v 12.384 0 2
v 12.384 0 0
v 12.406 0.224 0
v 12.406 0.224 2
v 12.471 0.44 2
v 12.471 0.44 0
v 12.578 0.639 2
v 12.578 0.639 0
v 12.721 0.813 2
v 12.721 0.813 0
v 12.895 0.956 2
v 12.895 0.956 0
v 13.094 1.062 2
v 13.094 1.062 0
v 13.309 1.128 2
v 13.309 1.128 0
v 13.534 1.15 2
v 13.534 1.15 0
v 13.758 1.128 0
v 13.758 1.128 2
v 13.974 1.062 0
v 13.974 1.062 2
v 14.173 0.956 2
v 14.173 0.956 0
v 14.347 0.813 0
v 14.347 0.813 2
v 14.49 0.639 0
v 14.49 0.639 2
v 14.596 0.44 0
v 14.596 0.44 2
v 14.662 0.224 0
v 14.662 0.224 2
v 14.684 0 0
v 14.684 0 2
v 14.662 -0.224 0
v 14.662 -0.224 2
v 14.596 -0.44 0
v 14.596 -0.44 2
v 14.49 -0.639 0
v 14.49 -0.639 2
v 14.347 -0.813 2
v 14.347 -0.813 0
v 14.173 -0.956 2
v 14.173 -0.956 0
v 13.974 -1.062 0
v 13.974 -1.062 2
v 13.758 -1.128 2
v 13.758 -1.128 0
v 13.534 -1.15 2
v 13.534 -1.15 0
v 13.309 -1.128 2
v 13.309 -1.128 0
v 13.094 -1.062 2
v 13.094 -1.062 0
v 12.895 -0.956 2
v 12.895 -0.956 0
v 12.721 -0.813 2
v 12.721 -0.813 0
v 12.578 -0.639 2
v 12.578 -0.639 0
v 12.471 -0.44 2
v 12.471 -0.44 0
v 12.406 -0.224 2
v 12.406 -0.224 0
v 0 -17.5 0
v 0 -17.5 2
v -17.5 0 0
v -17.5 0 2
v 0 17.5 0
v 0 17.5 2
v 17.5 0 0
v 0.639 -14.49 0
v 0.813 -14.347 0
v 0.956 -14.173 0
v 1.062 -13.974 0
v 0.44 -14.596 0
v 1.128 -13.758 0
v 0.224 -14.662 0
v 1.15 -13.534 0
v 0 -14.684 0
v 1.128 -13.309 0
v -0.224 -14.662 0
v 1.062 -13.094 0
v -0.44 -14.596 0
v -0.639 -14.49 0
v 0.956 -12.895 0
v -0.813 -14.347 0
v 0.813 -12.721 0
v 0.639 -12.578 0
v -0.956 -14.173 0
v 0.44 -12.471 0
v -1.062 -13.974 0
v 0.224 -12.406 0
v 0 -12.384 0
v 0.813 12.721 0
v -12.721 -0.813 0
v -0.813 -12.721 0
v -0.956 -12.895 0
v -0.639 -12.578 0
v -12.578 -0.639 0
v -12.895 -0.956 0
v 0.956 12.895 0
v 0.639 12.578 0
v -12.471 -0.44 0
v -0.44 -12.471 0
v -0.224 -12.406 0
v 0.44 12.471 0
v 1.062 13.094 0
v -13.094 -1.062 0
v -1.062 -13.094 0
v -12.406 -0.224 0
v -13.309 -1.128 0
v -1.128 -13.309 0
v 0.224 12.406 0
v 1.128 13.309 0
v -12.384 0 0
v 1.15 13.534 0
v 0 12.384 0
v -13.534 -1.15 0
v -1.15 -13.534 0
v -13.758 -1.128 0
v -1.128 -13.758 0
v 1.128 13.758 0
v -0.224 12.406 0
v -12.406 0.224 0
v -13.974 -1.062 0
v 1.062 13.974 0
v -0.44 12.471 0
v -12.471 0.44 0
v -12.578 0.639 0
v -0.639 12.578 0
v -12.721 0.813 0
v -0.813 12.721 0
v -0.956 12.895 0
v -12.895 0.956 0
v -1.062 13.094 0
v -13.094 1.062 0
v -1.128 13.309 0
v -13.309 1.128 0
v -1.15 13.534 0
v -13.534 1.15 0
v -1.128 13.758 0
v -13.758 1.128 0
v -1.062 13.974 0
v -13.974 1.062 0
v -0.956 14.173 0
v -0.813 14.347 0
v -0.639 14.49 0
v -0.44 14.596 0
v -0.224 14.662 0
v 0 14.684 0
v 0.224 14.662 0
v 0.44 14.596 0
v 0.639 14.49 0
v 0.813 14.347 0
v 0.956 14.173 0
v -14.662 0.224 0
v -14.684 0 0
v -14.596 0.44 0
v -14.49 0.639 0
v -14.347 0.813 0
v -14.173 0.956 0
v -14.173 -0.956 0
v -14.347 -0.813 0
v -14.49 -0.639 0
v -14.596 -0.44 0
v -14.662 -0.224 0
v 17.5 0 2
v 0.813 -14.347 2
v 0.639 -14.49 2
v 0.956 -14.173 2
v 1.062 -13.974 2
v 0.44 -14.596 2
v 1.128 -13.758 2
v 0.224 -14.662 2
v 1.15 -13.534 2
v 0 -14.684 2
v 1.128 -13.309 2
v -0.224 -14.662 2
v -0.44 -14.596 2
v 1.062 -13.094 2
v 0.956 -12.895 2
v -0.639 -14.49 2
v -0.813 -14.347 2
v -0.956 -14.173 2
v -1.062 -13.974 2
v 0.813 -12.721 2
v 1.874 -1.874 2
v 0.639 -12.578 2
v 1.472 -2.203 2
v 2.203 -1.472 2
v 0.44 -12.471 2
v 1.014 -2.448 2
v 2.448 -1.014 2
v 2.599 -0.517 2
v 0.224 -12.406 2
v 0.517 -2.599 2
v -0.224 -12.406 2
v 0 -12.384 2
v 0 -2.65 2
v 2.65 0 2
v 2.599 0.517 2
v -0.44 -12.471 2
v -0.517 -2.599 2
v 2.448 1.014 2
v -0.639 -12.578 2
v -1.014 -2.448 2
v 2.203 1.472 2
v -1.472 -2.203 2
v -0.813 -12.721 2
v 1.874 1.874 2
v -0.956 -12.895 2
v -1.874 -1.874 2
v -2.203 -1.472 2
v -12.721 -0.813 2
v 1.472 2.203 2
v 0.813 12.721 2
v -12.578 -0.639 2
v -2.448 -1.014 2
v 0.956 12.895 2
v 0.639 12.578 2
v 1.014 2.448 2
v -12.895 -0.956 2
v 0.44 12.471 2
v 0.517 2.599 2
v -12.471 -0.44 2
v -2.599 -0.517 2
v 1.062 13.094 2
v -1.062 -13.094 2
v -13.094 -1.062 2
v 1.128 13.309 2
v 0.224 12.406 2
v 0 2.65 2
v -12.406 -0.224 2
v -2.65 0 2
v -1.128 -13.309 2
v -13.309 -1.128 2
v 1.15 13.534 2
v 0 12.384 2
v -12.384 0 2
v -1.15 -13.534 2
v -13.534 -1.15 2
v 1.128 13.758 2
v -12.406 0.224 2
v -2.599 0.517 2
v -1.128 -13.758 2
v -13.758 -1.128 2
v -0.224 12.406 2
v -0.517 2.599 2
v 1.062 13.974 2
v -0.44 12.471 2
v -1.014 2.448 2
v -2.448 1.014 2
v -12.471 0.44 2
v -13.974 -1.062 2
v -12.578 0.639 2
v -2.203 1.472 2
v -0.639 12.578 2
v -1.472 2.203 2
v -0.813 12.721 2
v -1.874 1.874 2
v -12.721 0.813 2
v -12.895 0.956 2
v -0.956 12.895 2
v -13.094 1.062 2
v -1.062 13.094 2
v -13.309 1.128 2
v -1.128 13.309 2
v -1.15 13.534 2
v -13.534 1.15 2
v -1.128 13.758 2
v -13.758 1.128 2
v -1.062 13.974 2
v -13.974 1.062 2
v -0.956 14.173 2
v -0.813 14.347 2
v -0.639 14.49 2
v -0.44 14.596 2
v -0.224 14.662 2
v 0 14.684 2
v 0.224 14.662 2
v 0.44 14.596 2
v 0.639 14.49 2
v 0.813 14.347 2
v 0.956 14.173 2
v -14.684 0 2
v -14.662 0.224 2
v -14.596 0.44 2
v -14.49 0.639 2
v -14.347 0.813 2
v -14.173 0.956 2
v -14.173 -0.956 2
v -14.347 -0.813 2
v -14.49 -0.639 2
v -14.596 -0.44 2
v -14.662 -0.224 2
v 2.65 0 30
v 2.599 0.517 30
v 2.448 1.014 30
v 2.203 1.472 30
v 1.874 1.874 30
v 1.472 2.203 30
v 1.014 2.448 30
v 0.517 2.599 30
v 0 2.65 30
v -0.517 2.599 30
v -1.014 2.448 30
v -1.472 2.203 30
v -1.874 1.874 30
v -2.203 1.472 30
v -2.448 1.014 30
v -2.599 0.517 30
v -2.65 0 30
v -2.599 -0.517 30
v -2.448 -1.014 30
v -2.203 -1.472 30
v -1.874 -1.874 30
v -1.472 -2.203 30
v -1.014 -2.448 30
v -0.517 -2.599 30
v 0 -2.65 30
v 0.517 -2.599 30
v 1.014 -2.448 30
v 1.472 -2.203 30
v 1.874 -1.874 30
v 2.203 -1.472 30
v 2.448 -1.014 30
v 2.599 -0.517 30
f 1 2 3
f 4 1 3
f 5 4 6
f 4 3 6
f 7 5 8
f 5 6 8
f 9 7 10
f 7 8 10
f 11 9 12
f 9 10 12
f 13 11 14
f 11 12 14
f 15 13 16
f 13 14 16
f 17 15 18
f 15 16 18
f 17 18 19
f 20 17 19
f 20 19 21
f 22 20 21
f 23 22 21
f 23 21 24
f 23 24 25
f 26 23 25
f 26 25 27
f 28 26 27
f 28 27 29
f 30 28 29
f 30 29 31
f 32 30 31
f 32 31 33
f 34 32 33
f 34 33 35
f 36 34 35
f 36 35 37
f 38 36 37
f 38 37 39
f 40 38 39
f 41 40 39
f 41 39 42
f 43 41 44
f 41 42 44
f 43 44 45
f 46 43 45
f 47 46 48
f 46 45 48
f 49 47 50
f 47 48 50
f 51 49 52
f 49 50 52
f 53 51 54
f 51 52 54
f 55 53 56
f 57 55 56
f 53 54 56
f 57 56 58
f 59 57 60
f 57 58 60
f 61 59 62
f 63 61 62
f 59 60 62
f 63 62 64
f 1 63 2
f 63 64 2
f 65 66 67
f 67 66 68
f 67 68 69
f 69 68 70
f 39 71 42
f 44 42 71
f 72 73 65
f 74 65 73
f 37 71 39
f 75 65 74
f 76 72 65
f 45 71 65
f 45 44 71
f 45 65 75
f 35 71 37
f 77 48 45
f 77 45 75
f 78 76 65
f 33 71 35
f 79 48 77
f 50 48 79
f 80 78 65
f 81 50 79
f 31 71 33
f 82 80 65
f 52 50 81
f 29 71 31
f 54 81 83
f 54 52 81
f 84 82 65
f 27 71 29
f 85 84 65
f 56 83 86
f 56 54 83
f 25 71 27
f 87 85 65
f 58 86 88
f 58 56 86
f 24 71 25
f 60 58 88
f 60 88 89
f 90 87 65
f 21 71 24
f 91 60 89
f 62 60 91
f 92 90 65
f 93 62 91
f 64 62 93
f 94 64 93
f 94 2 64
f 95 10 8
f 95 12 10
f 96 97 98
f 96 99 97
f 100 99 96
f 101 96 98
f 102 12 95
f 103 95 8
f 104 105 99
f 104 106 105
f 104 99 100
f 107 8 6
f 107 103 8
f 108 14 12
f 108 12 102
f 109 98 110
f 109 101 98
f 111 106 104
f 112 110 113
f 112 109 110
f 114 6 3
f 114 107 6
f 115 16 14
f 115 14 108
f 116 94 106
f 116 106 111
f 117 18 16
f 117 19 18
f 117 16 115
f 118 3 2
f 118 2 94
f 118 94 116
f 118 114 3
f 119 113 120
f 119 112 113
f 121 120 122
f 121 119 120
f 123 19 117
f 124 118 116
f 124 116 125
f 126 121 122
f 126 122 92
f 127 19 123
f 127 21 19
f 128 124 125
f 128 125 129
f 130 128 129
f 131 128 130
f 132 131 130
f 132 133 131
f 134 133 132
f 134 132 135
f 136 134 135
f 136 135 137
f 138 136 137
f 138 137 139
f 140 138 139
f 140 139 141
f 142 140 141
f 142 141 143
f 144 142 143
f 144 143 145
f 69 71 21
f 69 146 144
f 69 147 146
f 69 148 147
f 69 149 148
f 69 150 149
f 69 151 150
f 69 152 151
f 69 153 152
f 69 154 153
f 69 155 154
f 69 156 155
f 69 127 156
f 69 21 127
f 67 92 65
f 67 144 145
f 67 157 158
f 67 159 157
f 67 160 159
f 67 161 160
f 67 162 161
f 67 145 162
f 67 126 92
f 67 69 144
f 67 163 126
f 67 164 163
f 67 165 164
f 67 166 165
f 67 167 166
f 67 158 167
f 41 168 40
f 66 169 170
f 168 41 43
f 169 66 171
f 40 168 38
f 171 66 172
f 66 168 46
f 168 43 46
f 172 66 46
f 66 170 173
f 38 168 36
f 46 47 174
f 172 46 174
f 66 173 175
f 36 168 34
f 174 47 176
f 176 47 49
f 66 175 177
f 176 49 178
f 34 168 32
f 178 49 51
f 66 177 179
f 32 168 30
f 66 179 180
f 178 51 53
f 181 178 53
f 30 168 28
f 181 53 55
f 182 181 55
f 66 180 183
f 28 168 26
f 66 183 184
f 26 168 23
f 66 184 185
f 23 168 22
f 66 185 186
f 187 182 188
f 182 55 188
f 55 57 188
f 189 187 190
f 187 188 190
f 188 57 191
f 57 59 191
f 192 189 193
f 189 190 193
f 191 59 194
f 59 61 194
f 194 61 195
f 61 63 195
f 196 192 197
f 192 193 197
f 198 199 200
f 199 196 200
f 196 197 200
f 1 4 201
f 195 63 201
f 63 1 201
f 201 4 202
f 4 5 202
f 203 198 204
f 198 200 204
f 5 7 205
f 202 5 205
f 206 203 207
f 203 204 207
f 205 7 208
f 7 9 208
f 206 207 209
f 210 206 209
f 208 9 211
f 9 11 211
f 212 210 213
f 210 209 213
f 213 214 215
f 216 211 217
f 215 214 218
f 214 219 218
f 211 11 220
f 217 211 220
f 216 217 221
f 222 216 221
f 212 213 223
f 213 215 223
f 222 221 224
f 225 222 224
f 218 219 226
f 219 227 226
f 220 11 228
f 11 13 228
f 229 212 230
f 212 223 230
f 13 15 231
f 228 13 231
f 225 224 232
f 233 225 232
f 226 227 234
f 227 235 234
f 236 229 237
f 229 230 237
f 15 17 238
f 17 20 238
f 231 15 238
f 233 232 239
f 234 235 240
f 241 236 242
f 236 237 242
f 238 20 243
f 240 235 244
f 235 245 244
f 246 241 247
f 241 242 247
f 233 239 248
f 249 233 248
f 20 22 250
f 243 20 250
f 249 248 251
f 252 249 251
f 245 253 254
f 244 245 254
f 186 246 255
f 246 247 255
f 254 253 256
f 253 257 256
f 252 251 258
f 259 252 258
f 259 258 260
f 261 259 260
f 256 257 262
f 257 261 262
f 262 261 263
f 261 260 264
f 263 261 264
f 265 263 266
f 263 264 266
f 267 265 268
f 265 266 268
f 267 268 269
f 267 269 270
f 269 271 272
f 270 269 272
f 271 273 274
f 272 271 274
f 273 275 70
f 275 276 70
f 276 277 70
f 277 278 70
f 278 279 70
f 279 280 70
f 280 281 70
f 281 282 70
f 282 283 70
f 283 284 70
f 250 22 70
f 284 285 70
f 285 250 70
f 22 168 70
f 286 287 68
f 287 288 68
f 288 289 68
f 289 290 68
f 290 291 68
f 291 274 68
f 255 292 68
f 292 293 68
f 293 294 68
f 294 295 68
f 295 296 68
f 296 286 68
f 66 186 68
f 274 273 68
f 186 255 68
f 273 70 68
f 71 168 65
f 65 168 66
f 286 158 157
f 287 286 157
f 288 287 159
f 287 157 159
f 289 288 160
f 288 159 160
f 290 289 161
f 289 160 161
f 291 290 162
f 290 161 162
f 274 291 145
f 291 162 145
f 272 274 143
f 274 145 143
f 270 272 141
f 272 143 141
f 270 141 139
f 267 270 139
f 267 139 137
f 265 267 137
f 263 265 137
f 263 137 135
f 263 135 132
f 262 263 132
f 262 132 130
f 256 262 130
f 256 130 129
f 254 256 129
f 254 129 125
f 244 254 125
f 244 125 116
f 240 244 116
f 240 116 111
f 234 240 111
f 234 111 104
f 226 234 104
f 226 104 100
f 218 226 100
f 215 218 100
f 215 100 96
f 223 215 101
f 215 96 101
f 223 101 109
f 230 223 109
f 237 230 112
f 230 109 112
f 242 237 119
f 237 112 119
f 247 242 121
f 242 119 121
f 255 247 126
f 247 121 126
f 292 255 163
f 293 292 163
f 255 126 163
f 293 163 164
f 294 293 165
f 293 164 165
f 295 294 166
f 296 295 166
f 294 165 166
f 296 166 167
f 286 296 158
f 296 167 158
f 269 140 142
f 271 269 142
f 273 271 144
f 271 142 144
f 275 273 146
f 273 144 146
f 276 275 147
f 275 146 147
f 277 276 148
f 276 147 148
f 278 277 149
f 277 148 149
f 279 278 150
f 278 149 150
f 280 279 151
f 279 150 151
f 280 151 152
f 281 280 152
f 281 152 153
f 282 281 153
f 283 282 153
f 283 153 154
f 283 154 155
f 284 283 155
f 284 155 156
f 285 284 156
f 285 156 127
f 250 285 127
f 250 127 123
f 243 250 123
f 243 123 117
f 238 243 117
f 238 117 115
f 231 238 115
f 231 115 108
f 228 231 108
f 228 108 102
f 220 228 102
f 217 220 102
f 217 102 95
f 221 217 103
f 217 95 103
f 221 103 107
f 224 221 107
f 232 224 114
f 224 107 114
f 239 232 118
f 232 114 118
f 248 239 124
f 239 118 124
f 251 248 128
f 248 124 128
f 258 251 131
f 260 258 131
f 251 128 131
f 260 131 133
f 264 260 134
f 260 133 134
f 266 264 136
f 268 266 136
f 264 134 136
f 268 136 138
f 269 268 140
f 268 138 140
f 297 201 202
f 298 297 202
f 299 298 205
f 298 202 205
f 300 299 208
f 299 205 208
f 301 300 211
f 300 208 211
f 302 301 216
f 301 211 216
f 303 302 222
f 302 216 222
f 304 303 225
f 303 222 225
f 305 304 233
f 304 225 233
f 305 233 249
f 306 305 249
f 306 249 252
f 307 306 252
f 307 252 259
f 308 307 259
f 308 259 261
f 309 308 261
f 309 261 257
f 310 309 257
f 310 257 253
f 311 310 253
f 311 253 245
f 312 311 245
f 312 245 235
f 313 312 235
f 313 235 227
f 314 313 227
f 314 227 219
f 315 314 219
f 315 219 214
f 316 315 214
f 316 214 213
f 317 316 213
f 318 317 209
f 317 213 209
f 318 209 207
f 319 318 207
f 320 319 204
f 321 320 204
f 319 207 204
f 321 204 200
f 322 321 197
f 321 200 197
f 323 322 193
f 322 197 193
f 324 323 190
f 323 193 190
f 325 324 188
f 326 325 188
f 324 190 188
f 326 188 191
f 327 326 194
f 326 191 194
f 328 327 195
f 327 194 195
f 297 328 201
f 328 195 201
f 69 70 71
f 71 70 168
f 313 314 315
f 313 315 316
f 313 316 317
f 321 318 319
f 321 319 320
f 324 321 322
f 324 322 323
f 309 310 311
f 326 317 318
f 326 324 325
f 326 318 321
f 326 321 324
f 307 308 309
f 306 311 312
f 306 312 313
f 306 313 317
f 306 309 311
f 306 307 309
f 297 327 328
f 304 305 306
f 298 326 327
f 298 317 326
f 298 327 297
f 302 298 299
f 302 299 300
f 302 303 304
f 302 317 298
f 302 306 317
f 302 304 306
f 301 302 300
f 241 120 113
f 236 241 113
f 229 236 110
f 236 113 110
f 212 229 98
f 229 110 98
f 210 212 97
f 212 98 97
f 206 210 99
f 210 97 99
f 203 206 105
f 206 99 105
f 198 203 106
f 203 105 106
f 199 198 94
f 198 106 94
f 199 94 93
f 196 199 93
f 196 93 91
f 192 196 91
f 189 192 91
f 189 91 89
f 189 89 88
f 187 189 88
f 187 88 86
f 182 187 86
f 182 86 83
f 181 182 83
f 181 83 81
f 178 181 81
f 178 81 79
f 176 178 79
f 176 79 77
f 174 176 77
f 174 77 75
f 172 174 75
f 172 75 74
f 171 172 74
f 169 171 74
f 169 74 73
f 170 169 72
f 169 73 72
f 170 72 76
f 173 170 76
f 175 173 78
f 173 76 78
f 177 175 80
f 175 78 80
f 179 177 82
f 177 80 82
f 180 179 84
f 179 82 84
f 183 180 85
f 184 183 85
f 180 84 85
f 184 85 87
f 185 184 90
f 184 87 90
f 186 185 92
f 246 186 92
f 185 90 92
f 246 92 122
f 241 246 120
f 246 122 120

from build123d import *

# Parameters (mm, degrees)
SKETCH_1_R          = 2.65
EXTRUDE_1_DEPTH     = 30
SKETCH_2_W          = 35
SKETCH_2_H          = 35
EXTRUDE_2_DEPTH     = 2
SKETCH_8_R          = 1.15
CUT_EXTRUDE_5_DEPTH = 5
SKETCH_10_OUTSIDE_W = 48.576
SKETCH_10_OUTSIDE_H = 48.576
CUT_EXTRUDE_6_DEPTH = 5


with BuildPart() as part:
    # 스케치1 → 보스-돌출1 (new body)
    with BuildSketch(Plane.XY):
        Circle(SKETCH_1_R)
    extrude(amount=EXTRUDE_1_DEPTH)

    # 스케치2 → 보스-돌출2 (add)
    with BuildSketch(Plane(origin=(0, 0, 0), x_dir=(-1, 0, 0), z_dir=(0, 0, -1))):
        Rectangle(SKETCH_2_W, SKETCH_2_H)
    extrude(amount=-EXTRUDE_2_DEPTH)

    # 스케치8 → 컷-돌출5 (cut)
    with BuildSketch(Plane(origin=(0, 0, 0), x_dir=(-1, 0, 0), z_dir=(0, 0, -1))):
        with Locations((13.533711803, 0)):
            Circle(SKETCH_8_R)
        with Locations((0, -13.533711803)):
            Circle(SKETCH_8_R)
        with Locations((-13.533711803, 0)):
            Circle(SKETCH_8_R)
        with Locations((0, 13.533711803)):
            Circle(SKETCH_8_R)
    extrude(amount=-CUT_EXTRUDE_5_DEPTH, mode=Mode.SUBTRACT)

    # 스케치10 outside → 컷-돌출6 (cut)
    with BuildSketch(Plane.XY.offset(2)):
        Rectangle(SKETCH_10_OUTSIDE_W, SKETCH_10_OUTSIDE_H)
        Polygon((-17.5, 0), (0, 17.5), (17.5, 0), (0, -17.5), align=None, mode=Mode.SUBTRACT)
    extrude(amount=-CUT_EXTRUDE_6_DEPTH, mode=Mode.SUBTRACT)


solid = part.part
